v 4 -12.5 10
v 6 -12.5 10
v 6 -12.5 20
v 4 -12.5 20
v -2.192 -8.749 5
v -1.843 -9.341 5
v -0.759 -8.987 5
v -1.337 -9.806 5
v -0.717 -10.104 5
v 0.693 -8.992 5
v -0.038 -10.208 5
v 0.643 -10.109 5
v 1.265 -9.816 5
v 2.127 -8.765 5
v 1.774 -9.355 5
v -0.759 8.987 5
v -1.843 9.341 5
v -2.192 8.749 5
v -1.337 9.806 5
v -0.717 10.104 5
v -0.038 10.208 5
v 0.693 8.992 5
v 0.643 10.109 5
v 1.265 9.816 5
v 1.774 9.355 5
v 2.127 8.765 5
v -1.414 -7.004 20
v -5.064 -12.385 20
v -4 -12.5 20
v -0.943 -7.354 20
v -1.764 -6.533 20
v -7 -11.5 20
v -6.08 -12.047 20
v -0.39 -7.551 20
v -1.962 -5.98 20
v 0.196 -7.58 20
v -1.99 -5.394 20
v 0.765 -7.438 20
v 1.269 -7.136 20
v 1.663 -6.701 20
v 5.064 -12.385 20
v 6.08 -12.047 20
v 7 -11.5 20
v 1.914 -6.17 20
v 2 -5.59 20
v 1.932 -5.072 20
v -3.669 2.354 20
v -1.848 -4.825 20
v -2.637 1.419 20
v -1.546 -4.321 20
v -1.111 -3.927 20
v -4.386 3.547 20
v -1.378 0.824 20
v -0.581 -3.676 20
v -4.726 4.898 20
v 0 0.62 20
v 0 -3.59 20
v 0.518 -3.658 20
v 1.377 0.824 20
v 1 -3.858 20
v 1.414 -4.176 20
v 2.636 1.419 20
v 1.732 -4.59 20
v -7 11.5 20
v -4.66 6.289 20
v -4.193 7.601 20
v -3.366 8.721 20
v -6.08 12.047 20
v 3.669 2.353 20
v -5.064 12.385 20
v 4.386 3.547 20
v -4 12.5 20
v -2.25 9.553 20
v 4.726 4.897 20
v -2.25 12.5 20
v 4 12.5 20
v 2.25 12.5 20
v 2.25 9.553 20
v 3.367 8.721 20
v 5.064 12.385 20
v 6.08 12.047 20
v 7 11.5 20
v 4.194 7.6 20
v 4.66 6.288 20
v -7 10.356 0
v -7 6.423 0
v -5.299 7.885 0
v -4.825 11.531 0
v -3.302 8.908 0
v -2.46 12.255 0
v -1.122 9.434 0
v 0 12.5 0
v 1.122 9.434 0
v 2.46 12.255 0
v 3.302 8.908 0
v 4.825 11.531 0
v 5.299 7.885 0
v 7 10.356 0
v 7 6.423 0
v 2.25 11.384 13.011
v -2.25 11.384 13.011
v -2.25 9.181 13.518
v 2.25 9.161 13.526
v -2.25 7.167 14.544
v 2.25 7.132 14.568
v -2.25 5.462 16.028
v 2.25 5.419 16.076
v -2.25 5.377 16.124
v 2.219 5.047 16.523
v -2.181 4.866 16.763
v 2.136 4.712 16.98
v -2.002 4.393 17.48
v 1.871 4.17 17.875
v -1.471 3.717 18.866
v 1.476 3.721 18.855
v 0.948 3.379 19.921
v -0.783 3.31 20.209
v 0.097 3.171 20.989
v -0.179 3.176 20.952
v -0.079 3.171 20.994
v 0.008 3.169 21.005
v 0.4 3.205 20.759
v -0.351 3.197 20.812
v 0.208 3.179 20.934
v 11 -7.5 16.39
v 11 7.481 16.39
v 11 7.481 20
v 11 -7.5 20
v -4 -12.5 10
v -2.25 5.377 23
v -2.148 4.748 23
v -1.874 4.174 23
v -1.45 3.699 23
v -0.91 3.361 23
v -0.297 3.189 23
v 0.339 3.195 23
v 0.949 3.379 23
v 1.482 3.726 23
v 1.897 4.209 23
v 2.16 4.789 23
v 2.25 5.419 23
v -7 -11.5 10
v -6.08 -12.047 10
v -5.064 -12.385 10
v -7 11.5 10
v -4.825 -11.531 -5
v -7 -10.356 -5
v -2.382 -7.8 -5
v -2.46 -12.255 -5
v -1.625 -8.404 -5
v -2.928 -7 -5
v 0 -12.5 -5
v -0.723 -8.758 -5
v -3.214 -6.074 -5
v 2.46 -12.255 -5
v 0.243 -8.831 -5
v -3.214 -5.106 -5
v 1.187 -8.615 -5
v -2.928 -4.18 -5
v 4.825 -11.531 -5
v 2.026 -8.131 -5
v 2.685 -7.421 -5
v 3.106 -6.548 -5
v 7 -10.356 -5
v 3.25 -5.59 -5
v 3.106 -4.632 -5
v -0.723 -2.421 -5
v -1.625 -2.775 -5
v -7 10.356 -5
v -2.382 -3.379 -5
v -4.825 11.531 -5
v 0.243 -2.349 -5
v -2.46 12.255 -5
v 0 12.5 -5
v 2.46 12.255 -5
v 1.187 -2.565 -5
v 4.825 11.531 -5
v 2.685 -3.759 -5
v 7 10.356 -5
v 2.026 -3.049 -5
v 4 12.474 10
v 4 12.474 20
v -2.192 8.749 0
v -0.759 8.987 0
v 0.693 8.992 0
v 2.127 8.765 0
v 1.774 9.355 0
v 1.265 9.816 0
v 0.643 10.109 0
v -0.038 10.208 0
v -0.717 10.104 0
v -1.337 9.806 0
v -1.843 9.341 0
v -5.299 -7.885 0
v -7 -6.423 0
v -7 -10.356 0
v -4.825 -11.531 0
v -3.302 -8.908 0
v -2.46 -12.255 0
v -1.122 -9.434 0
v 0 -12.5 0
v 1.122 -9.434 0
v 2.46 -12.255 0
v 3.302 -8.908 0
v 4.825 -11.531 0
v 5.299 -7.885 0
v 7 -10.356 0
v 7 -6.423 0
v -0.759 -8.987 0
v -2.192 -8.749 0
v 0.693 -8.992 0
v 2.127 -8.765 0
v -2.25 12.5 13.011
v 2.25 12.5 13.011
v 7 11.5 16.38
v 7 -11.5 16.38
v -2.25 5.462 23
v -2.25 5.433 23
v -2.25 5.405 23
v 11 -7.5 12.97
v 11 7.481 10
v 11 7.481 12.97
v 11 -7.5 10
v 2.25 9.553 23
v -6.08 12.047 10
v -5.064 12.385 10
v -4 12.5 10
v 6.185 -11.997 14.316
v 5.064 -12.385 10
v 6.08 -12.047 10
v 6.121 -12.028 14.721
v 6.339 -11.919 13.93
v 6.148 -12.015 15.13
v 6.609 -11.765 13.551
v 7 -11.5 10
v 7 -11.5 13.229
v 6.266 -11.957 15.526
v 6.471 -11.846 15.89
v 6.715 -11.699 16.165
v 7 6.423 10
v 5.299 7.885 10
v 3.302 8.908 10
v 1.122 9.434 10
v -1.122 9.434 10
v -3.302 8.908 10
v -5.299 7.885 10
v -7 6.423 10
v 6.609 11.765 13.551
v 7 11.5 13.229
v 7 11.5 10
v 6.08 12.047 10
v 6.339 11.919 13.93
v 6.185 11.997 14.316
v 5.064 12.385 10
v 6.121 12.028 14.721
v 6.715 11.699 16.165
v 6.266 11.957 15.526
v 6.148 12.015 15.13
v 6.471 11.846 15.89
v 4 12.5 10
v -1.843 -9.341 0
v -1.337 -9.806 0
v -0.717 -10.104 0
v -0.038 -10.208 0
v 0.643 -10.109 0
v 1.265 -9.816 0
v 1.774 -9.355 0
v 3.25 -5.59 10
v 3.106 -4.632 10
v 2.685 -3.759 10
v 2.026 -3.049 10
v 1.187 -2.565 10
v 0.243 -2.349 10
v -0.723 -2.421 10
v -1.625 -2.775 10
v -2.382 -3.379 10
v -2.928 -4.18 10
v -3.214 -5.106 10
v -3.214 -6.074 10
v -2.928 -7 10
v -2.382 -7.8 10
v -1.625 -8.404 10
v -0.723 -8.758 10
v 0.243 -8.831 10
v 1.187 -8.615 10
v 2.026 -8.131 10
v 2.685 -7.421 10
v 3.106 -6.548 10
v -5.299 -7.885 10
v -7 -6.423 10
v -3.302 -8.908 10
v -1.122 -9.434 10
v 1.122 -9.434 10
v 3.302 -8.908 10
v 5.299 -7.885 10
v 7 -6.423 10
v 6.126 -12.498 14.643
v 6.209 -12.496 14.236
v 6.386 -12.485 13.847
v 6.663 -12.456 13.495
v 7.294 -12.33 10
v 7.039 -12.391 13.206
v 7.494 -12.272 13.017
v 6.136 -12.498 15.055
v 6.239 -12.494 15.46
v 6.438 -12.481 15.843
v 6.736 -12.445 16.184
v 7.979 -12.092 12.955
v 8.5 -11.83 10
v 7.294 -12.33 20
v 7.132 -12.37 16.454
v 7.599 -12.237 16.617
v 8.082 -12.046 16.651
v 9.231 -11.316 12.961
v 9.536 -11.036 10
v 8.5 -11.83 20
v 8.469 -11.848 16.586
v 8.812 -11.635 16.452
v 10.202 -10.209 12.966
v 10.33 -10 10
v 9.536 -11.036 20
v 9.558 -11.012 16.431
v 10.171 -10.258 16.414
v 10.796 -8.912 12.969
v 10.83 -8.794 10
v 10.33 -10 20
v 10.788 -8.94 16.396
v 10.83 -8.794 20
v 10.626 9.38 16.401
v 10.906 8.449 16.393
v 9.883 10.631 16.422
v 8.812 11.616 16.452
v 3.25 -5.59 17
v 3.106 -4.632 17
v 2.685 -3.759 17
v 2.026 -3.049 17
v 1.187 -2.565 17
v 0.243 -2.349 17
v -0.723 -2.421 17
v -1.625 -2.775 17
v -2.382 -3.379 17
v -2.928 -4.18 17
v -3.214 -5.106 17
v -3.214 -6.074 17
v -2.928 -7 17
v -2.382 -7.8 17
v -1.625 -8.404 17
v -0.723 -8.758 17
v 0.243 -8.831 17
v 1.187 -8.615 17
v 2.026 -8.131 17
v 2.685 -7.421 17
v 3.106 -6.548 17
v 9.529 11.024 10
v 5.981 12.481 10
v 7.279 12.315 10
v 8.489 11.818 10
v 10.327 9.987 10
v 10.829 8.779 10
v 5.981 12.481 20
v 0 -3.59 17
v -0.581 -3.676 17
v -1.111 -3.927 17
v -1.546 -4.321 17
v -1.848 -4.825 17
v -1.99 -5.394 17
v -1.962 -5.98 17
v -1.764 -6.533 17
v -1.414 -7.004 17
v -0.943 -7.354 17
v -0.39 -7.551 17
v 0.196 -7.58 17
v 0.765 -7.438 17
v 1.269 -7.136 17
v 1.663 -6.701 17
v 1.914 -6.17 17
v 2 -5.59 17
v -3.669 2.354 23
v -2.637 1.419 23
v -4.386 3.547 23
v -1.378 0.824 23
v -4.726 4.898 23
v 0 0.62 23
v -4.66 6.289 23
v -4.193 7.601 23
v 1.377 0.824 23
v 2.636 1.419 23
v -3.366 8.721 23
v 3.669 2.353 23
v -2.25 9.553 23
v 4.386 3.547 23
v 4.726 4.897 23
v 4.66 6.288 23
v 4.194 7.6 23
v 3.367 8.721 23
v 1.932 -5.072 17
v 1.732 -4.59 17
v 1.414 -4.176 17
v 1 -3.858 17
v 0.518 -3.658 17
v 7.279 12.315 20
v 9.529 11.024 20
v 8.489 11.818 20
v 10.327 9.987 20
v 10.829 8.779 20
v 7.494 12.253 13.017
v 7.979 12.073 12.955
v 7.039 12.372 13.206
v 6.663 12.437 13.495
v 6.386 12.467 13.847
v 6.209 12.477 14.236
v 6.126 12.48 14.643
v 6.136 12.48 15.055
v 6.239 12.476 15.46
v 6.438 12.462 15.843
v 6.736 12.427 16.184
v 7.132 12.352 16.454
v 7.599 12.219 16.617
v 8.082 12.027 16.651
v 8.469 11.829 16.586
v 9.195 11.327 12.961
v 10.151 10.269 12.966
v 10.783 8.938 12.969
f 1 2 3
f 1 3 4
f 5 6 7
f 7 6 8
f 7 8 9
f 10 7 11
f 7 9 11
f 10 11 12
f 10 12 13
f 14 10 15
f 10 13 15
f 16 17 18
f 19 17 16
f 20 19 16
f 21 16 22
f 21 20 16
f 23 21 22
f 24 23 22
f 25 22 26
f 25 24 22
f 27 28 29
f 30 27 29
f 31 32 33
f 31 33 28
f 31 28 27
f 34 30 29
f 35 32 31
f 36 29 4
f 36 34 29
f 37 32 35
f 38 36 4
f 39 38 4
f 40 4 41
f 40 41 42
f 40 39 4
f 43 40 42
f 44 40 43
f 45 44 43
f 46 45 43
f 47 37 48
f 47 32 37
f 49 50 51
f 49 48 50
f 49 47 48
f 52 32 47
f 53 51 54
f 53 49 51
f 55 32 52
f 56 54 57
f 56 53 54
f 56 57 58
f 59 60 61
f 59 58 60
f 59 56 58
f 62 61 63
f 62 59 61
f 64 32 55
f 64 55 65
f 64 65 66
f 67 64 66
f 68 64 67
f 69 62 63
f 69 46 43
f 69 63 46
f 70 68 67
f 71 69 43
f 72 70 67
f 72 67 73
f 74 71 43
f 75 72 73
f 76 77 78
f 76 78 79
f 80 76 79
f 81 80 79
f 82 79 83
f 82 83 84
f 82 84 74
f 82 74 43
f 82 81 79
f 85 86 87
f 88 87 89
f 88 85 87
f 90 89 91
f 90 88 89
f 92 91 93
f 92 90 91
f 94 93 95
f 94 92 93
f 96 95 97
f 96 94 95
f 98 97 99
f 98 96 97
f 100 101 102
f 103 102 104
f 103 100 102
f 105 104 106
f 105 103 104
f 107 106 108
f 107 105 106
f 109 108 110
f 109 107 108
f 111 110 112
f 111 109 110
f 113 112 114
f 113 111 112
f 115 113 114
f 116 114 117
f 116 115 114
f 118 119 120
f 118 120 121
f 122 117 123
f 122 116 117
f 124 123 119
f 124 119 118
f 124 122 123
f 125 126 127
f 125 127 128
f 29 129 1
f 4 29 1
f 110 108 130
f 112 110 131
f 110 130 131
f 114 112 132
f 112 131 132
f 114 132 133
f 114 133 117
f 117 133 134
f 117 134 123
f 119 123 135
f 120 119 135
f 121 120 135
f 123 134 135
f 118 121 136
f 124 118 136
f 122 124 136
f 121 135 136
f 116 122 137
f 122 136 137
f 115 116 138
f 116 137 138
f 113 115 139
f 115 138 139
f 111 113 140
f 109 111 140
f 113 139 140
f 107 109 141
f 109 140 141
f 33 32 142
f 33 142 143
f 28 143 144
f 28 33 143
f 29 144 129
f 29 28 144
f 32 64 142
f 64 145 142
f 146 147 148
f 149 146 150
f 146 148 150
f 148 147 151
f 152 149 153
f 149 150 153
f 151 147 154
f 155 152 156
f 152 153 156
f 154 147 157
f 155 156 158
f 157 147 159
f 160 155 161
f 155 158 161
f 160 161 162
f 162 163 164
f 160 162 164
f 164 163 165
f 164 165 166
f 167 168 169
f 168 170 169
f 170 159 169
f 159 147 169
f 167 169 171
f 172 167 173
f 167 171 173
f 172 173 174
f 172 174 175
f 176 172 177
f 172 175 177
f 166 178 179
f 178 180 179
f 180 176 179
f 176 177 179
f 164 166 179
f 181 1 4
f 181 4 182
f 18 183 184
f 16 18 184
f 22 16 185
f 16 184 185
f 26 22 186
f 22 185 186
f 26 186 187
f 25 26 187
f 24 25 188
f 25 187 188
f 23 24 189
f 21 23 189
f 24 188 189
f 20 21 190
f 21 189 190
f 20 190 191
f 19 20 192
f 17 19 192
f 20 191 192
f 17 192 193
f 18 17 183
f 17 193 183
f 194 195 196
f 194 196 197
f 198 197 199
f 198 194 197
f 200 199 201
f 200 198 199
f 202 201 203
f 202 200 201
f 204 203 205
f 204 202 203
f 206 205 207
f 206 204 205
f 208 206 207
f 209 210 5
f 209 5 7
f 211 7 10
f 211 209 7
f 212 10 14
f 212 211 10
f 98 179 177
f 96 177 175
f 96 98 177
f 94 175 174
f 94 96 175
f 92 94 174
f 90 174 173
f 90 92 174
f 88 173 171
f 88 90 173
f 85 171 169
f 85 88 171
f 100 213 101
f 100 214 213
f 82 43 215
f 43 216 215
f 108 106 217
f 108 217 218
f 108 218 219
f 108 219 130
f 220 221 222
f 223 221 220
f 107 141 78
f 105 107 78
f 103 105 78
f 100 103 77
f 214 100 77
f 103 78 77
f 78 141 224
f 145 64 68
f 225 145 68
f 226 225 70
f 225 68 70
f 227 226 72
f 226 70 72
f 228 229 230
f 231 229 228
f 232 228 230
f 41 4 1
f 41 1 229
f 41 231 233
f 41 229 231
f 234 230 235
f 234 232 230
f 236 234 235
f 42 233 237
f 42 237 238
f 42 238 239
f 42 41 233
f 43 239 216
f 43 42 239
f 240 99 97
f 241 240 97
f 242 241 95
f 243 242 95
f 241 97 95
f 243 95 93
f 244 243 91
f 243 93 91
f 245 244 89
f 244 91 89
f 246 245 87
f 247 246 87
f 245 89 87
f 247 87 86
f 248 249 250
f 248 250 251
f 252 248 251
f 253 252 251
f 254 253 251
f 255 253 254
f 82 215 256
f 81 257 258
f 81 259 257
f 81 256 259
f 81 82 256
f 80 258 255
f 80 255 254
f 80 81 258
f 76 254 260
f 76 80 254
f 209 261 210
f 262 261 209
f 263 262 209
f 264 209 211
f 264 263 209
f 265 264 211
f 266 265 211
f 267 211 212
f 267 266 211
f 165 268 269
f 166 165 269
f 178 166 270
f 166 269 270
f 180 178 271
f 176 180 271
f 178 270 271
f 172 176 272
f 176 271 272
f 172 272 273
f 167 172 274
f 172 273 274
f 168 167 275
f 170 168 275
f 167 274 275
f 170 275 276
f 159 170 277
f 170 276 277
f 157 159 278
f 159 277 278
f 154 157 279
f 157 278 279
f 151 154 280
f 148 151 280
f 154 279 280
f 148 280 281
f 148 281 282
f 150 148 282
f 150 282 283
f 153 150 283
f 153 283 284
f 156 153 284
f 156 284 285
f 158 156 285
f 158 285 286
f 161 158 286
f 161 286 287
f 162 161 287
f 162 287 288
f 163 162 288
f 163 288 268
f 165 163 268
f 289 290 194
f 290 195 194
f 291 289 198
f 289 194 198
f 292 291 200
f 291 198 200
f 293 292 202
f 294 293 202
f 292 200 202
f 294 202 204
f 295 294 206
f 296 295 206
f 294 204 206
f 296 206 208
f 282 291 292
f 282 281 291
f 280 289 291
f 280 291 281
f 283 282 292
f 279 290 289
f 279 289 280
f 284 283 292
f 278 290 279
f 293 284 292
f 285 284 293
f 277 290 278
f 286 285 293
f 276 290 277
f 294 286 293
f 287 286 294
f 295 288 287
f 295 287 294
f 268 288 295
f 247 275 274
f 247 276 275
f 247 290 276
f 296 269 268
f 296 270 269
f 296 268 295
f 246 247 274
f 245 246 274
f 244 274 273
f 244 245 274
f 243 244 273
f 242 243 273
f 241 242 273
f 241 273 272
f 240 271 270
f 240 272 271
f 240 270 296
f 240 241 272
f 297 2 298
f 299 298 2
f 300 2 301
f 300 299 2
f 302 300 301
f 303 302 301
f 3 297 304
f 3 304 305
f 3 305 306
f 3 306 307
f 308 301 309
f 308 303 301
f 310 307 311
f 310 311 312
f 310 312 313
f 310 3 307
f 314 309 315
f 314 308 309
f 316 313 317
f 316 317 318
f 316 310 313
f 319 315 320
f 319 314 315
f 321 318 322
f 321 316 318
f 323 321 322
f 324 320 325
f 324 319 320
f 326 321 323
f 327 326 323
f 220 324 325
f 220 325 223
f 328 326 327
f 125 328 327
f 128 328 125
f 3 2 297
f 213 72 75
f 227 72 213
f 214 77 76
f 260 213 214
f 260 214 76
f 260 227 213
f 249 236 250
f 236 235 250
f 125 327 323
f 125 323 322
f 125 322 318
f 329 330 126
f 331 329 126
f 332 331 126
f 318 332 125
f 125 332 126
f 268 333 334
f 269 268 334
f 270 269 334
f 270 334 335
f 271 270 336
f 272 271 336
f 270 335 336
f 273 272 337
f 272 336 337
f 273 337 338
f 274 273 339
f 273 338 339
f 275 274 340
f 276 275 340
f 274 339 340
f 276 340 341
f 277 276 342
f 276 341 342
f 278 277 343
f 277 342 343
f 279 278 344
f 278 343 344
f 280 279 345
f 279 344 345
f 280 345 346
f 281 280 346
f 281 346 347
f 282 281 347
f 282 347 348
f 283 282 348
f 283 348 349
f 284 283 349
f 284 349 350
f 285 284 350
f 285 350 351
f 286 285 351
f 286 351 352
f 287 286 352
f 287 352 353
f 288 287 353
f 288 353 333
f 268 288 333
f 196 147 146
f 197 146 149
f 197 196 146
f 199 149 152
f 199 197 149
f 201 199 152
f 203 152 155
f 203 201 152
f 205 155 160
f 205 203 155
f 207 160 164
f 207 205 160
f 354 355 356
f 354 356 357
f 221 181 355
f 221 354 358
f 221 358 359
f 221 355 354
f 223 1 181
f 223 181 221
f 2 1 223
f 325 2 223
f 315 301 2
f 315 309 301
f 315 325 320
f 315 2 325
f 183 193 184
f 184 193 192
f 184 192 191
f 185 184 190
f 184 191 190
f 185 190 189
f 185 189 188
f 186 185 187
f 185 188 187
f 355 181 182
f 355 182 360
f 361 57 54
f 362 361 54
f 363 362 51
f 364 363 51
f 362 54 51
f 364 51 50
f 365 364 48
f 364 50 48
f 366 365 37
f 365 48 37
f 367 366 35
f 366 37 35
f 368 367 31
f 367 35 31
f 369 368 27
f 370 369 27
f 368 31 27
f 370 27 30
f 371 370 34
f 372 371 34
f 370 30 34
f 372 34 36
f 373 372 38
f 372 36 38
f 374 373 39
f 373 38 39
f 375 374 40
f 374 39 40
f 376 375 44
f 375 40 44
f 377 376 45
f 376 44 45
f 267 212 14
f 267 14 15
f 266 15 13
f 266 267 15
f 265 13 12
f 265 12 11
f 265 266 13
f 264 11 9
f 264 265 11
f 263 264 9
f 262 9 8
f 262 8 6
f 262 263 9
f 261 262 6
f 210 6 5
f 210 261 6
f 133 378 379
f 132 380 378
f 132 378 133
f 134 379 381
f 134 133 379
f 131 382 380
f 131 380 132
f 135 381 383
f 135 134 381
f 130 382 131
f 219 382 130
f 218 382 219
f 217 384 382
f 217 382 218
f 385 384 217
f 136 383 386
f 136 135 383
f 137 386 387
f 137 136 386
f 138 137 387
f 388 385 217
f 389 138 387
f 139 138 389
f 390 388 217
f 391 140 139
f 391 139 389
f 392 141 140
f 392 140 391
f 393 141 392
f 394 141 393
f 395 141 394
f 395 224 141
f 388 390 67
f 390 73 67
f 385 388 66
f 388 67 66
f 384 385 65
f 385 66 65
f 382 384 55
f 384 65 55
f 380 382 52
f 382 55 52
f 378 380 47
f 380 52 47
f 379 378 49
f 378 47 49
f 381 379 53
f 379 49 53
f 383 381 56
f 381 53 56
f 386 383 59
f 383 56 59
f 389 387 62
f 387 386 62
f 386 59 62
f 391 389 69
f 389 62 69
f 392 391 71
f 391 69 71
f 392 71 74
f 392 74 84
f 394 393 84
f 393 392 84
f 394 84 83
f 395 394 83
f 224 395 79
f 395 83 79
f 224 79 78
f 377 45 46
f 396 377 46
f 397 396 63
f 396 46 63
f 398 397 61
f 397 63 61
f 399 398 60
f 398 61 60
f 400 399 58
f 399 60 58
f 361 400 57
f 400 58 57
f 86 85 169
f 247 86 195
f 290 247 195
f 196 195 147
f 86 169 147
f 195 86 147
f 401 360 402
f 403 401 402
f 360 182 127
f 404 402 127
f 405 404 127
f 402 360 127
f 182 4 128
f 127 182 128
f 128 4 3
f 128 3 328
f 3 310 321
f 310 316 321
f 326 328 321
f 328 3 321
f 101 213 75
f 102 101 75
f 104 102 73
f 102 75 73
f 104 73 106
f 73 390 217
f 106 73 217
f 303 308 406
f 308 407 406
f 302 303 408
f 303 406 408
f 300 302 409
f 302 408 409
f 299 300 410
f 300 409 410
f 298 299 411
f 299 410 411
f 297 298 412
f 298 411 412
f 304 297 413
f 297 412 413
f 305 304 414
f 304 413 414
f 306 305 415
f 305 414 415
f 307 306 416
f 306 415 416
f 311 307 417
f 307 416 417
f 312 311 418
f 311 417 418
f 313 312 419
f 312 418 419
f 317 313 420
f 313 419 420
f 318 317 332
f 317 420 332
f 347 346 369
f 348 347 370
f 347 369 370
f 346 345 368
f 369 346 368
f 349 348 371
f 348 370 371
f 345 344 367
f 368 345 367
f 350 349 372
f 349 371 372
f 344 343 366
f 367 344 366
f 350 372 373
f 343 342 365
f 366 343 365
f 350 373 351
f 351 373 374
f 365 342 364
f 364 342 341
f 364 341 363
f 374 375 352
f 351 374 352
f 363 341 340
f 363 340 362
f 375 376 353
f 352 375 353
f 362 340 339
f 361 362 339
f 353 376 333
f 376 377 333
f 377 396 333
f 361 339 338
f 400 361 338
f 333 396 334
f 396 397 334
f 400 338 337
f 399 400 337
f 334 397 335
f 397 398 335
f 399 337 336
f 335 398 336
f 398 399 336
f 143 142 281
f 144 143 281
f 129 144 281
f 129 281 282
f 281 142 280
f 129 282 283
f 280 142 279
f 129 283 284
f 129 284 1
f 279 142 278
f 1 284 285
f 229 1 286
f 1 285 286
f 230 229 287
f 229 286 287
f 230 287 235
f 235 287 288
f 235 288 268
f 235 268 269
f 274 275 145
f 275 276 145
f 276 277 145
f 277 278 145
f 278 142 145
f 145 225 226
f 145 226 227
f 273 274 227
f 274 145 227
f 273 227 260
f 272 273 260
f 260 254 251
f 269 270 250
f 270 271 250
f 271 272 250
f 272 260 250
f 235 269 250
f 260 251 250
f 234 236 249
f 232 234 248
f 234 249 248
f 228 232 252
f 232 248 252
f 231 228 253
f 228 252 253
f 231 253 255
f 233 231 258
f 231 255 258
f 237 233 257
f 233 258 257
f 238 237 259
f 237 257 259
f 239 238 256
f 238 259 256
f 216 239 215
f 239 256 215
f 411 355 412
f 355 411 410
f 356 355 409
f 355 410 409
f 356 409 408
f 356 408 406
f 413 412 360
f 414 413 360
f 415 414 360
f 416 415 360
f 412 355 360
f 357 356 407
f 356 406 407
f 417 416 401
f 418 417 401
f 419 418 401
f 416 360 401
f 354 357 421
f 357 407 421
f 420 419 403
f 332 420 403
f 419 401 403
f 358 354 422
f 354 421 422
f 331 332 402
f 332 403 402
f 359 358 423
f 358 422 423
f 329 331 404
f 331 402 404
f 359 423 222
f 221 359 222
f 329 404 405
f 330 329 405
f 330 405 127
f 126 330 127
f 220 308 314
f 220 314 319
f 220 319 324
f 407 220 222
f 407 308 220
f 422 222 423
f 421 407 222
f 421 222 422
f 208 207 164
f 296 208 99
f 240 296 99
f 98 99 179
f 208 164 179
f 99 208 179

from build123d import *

# Parameters (mm, degrees)
F0_R      = 12.5
F1_DEPTH  = 5
F2_R      = 9.5
F3_DEPTH  = 10
F5_DEPTH  = 5
F7_W      = 30
F7_H      = 30
F7_W_2    = 15
F7_H_2    = 27
F8_DEPTH  = 10
F10_W     = 18
F10_H     = 25
F11_DEPTH = 10
F12_R     = 5
F13_R     = 4.75
F14_DEPTH = 3
F16_DEPTH = 25
F18_R     = 3.25
F19_DEPTH = 25
F22_DEPTH = 10
F23_W     = 15.5848370632
F23_H     = 13.4339891374
F24_DEPTH = 3
F29_W     = 21.2960224599
F29_H     = 32.8733809292
F30_DEPTH = 35
F33_DEPTH = 10
F34_R     = 5


with BuildPart() as f1:
    # F0 (on Top) → F1 (new body)
    with BuildSketch(Plane.XY):
        Circle(F0_R)
    extrude(amount=-F1_DEPTH)

    # F2 (on Top) → F3 (join)
    with BuildSketch(Plane.XY):
        Circle(F2_R)
    extrude(amount=F3_DEPTH)


with BuildPart() as f5:
    # F4 (on Top) → F5 (new body)
    with BuildSketch(Plane.XY):
        with BuildLine():
            ThreePointArc((-2.19192449, 8.7487287819), (-0.0332522533, 9.0190732649), (2.1273547272, 8.7646534521))
            ThreePointArc((2.1273547272, 8.7646534521), (-0.0376344683, 10.2076699565), (-2.19192449, 8.7487287819))
        make_face()
    extrude(amount=F5_DEPTH)


with BuildPart() as f6_1:
    # F6: instance of F5
    add(f5.part.mirror(Plane.XZ))


with BuildPart() as f8:
    # F7 (on Top) → F8 (new body, symmetric)
    with BuildSketch(Plane.XY):
        Rectangle(F7_W, F7_H)
        Rectangle(F7_W_2, F7_H_2, mode=Mode.SUBTRACT)
    extrude(amount=F8_DEPTH, both=True)


with BuildPart() as f1_1:
    add(f1.part)

    # F9: cut F8
    add(f8.part, mode=Mode.SUBTRACT)


with BuildPart() as f11:
    # F10 (on face) → F11 (new body)
    with BuildSketch(Plane.XY.offset(10)):
        Rectangle(F10_W, F10_H)
    extrude(amount=F11_DEPTH)

    # F12
    f12_edges = [f11.edges().sort_by_distance(p)[0] for p in [
        (-9, -12.5, 15),
        (9, -12.5, 15),
        (-9, 12.5, 15),
        (9, 12.5, 15),
    ]]
    fillet(f12_edges, radius=F12_R)

    # F13 (on face) → F14 (join)
    with BuildSketch(Plane.XY.offset(20)):
        with Locations((0, 5.3698644042)):
            Circle(F13_R)
    extrude(amount=F14_DEPTH)


with BuildPart() as f16:
    # F15 (on face) → F16 (new body)
    with BuildSketch(Plane.XY.offset(20)):
        with BuildLine():
            ThreePointArc((0, -3.5899061263), (-1.4142135624, -7.0041196886), (2, -5.5899061263))
            ThreePointArc((2, -5.5899061263), (1.4142135624, -4.1756925639), (0, -3.5899061263))
        make_face()
    extrude(amount=-F16_DEPTH)


with BuildPart() as f19:
    # F18 (on offset) → F19 (new body)
    with BuildSketch(Plane.XY.offset(17)):
        with Locations((0, -5.5899061263)):
            Circle(F18_R)
    extrude(amount=-F19_DEPTH)


with BuildPart() as f11_1:
    add(f11.part)

    # F20: cut F19, F16
    add(f19.part, mode=Mode.SUBTRACT)
    add(f16.part, mode=Mode.SUBTRACT)


with BuildPart() as f1_2:
    add(f1_1.part)

    # F20: cut F19, F16
    add(f19.part, mode=Mode.SUBTRACT)
    add(f16.part, mode=Mode.SUBTRACT)


with BuildPart() as f22:
    # F21 (on face) → F22 (new body)
    with BuildSketch(Plane.XY.offset(23)):
        with BuildLine():
            Line((-2.2496000585, 5.3767825914), (-2.2496000585, 5.4616254317))
            ThreePointArc((-2.2496000585, 5.4616254317), (-2.25, 5.4192040116), (-2.2496000585, 5.3767825914))
        make_face()
        with BuildLine():
            Line((-2.2496000585, 13.2603423141), (-2.2496000585, 5.4616254317))
            Line((-2.2496000585, 5.4616254317), (-2.2496000585, 5.3767825914))
            ThreePointArc((-2.2496000585, 5.3767825914), (0.0211542744, 3.1693034589), (2.2499999971, 5.4190892499))
            Line((2.2499999971, 5.4190892499), (2.2503999415, 13.2603423141))
            Line((2.2503999415, 13.2603423141), (-2.2496000585, 13.2603423141))
        make_face()
    extrude(amount=-F22_DEPTH)


with BuildPart() as f24:
    # F23 (on Right) → F24 (new body, symmetric)
    with BuildSketch(Plane.YZ):
        with Locations((8.6143131484, 18.0006176233)):
            Rectangle(F23_W, F23_H)
        with BuildLine():
            ThreePointArc((11.3841668327, 13.0113540217), (5.2042632853, 16.3271376428), (3.1254675568, 23.0252147695))
            Line((3.1254675568, 23.0252147695), (14.2911430448, 22.9898802936))
            Line((14.2911430448, 22.9898802936), (14.2911430448, 13.0113540217))
            Line((14.2911430448, 13.0113540217), (11.3841668327, 13.0113540217))
        make_face(mode=Mode.SUBTRACT)
    extrude(amount=F24_DEPTH, both=True)


with BuildPart() as f22_1:
    add(f22.part)

    # F25: cut F24
    add(f24.part, mode=Mode.SUBTRACT)


with BuildPart() as f11_2:
    add(f11_1.part)

    # F26: cut F22
    add(f22_1.part, mode=Mode.SUBTRACT)


with BuildPart() as f30:
    # F29 (on face) → F30 (new body)
    with BuildSketch(Plane(origin=(0, 0, -5), x_dir=(1, 0, 0), z_dir=(0, 0, -1))):
        Rectangle(F29_W, F29_H)
        with BuildLine():
            Line((-7, 10.3561575886), (-7, 13.5))
            Line((-7, 13.5), (7, 13.5))
            Line((7, 13.5), (7, 10.3561575886))
            ThreePointArc((7, 10.3561575886), (7.2521867086, 10.1811486554), (7.5, 10))
            Line((7.5, 10), (7.5, -10))
            ThreePointArc((7.5, -10), (7.2521867086, -10.1811486554), (7, -10.3561575886))
            Line((7, -10.3561575886), (7, -13.5))
            Line((7, -13.5), (-7, -13.5))
            Line((-7, -13.5), (-7, -10.3561575886))
            ThreePointArc((-7, -10.3561575886), (-7.2521867086, -10.1811486554), (-7.5, -10))
            Line((-7.5, -10), (-7.5, 10))
            ThreePointArc((-7.5, 10), (-7.2521867086, 10.1811486554), (-7, 10.3561575886))
        make_face(mode=Mode.SUBTRACT)
        with BuildLine():
            Line((-7, -10.3561575886), (-7, 10.3561575886))
            ThreePointArc((-7, 10.3561575886), (-7.2521867086, 10.1811486554), (-7.5, 10))
            Line((-7.5, 10), (-7.5, -10))
            ThreePointArc((-7.5, -10), (-7.2521867086, -10.1811486554), (-7, -10.3561575886))
        make_face()
        with BuildLine():
            ThreePointArc((7.5, 10), (7.2521867086, 10.1811486554), (7, 10.3561575886))
            Line((7, 10.3561575886), (7, -10.3561575886))
            ThreePointArc((7, -10.3561575886), (7.2521867086, -10.1811486554), (7.5, -10))
            Line((7.5, -10), (7.5, 10))
        make_face()
    extrude(amount=-F30_DEPTH)


with BuildPart() as f11_3:
    add(f11_2.part)

    # F31: cut F30
    add(f30.part, mode=Mode.SUBTRACT)


with BuildPart() as f6_1_1:
    add(f6_1.part)

    # F31: cut F30
    add(f30.part, mode=Mode.SUBTRACT)


with BuildPart() as f5_1:
    add(f5.part)

    # F31: cut F30
    add(f30.part, mode=Mode.SUBTRACT)


with BuildPart() as f1_3:
    add(f1_2.part)

    # F31: cut F30
    add(f30.part, mode=Mode.SUBTRACT)


with BuildPart() as f33:
    # F32 (on face) → F33 (new body)
    with BuildSketch(Plane(origin=(0, 0, 10), x_dir=(1, 0, 0), z_dir=(0, 0, -1))):
        Polygon((11, 12.5), (4, 12.5), (4, -12.4740964633), (11, -12.5), align=None)
    extrude(amount=-F33_DEPTH)

    # F34
    f34_edges = [f33.edges().sort_by_distance(p)[0] for p in [
        (11, 12.5, 15),
        (11, -12.5, 15),
    ]]
    fillet(f34_edges, radius=F34_R)


with BuildPart() as f35:
    # F35: sweep along a path in F27
    with BuildLine(Plane.XY) as f35_path:
        Line((4.9848833789, -15.7563891262), (4.9848833789, 9.1055910668))
        Line((4.9848833789, 9.1055910668), (4.9848833789, 13.8200307265))
    # F28 (on Front) → F35 (sweep)
    with BuildSketch(Plane.XZ):
        with BuildLine():
            Line((12.2512793168, 16.3550041616), (8.8115982367, 16.4517947039))
            ThreePointArc((8.8115982367, 16.4517947039), (6.1696448053, 15.2331387236), (7.9789617133, 12.9546715506))
            Line((7.9789617133, 12.9546715506), (12.2512793168, 12.9768972261))
            Line((12.2512793168, 12.9768972261), (12.2512793168, 16.3550041616))
        make_face()
    sweep(path=f35_path.line)


with BuildPart() as f11_4:
    add(f11_3.part)

    # F36: cut F35
    add(f35.part, mode=Mode.SUBTRACT)


with BuildPart() as f33_1:
    add(f33.part)

    # F36: cut F35
    add(f35.part, mode=Mode.SUBTRACT)


solid = Compound([f6_1_1.part, f5_1.part, f1_3.part, f11_4.part, f33_1.part])
